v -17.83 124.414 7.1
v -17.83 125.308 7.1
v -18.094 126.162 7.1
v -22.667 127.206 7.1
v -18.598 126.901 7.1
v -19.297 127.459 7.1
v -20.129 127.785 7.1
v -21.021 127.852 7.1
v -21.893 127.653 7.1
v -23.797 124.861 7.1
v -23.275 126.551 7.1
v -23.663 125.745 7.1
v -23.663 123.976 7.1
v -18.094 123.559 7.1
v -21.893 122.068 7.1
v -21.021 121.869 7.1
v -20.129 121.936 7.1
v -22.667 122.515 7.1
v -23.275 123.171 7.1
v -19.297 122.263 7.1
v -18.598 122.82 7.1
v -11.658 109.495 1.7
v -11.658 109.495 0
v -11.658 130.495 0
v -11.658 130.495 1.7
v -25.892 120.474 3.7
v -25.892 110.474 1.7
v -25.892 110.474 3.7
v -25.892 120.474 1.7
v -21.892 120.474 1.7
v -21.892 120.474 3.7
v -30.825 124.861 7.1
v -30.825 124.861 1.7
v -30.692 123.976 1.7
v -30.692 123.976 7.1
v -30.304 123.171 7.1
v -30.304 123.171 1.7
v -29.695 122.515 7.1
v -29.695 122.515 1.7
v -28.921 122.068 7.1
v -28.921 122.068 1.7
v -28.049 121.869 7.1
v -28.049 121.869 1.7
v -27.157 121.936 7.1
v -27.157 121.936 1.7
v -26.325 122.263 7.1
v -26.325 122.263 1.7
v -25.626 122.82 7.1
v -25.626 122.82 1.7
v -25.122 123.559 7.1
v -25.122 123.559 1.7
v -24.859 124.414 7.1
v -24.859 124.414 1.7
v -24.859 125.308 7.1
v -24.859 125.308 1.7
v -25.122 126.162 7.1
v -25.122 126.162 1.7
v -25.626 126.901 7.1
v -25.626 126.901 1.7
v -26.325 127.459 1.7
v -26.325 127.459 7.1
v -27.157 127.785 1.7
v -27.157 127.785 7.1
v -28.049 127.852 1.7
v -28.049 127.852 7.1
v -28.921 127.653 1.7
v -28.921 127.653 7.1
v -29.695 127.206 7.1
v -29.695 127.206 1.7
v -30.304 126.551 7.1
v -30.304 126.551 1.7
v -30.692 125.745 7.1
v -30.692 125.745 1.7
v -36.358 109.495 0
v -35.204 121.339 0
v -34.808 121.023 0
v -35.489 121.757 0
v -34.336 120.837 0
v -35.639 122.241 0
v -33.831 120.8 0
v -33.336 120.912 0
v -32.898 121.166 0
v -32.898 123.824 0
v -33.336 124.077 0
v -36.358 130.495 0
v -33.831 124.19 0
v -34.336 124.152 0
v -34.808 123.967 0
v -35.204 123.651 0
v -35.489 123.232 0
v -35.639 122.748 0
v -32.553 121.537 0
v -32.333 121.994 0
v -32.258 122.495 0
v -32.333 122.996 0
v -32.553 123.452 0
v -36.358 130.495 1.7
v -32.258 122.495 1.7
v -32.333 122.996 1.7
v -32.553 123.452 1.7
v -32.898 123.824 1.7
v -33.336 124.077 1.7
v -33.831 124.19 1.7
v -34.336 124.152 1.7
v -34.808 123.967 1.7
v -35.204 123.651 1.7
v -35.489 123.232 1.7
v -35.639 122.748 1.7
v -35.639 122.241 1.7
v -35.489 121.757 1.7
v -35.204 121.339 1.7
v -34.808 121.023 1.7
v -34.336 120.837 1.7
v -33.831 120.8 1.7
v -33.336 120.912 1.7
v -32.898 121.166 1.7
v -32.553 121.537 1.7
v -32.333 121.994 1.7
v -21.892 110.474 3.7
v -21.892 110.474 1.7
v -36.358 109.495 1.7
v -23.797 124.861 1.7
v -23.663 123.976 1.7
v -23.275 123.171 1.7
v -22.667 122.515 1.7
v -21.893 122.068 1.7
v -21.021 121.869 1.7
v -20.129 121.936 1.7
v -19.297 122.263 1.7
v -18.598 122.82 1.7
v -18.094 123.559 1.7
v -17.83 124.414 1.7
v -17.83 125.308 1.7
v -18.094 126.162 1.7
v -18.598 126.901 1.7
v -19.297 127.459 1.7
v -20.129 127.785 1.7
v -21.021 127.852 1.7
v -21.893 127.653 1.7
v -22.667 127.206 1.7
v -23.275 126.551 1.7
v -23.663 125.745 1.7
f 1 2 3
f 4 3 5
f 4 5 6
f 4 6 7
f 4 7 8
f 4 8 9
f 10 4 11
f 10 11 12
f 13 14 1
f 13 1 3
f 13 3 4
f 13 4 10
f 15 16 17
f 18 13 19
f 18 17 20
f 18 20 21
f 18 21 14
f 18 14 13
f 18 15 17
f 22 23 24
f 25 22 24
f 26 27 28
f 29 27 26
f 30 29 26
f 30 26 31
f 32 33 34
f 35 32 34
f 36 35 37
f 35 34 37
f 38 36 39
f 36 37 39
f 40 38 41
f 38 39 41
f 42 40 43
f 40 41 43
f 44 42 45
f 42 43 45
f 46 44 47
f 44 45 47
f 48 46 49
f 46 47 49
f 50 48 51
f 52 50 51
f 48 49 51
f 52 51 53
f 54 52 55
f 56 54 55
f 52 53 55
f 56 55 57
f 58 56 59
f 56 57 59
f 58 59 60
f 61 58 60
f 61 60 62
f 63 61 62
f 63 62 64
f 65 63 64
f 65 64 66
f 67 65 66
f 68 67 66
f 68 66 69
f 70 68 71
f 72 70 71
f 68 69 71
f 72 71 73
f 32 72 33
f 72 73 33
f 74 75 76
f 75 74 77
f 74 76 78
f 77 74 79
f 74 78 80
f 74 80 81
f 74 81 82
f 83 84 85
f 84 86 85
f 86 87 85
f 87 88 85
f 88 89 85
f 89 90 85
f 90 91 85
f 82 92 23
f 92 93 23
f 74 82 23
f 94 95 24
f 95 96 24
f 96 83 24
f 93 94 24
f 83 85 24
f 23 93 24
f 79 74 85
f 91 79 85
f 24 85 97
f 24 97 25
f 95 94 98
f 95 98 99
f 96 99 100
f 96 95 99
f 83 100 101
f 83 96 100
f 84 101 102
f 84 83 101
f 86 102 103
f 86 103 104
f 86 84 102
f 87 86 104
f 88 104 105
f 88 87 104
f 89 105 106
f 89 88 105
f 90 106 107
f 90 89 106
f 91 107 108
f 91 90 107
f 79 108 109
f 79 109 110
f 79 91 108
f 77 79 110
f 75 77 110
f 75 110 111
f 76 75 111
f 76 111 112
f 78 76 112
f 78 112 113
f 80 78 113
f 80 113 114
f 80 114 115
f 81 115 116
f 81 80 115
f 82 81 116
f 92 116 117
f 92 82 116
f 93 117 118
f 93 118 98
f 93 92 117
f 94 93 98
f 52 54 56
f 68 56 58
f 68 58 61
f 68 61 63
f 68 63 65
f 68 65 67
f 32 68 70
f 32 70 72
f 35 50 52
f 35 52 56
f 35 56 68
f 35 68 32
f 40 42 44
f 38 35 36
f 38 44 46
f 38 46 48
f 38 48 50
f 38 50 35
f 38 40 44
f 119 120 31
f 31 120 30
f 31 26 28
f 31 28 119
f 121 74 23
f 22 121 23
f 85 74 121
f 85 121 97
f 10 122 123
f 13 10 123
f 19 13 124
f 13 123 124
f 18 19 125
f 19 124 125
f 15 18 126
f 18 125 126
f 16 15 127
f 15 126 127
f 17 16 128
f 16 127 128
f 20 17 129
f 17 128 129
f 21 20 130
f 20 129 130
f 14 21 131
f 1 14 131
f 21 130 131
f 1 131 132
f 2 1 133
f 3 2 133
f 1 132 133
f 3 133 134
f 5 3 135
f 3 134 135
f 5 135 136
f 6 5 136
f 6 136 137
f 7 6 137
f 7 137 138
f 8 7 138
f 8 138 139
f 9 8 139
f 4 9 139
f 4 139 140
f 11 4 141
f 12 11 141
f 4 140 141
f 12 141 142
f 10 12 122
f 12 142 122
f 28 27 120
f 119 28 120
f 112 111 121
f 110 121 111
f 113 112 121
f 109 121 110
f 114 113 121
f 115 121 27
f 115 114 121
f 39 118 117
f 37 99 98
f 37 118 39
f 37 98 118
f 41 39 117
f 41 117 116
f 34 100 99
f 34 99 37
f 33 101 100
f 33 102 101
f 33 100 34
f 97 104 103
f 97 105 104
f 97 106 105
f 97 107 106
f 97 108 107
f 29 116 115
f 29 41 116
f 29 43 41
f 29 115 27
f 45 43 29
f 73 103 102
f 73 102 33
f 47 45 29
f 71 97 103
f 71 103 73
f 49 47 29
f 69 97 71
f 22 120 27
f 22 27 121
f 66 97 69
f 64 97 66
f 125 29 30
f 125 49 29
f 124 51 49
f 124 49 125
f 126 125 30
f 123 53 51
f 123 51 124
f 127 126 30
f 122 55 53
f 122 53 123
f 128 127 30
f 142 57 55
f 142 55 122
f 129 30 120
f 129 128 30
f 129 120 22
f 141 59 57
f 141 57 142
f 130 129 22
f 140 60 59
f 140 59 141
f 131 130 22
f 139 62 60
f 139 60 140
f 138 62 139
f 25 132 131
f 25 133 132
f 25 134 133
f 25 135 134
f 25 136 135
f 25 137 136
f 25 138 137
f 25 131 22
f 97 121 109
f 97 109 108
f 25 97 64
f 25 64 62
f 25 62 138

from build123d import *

# Parameters (mm, degrees)
SKETCH_1_W      = 24.7
SKETCH_1_H      = 21
SKETCH_1_R      = 1.7
EXTRUDE_1_DEPTH = 1.7
SKETCH_2_R      = 3
EXTRUDE_2_DEPTH = 5.4
SKETCH_3_W      = 4
SKETCH_3_H      = 10
EXTRUDE_3_DEPTH = 2


with BuildPart() as part:
    # Эскиз1 → Бобышка-Вытянуть1 (new body)
    with BuildSketch(Plane.XY):
        with Locations((-24.007558734, 119.994849308)):
            Rectangle(SKETCH_1_W, SKETCH_1_H)
        with Locations((-33.957558734, 122.494849308)):
            Circle(SKETCH_1_R, mode=Mode.SUBTRACT)
    extrude(amount=EXTRUDE_1_DEPTH)

    # Эскиз2 → Бобышка-Вытянуть2 (add)
    with BuildSketch(Plane.XY.offset(1.7)):
        with Locations(Location((-27.825017342, 124.86066732, 0), (0, 0, 180))):
            Circle(SKETCH_2_R)
        with Locations(Location((-20.796714073, 124.86066732, 0), (0, 0, 180))):
            Circle(SKETCH_2_R)
    extrude(amount=EXTRUDE_2_DEPTH)

    # Эскиз3 → Бобышка-Вытянуть3 (add)
    with BuildSketch(Plane.XY.offset(1.7)):
        with Locations((-23.892041325, 115.47395964)):
            Rectangle(SKETCH_3_W, SKETCH_3_H)
    extrude(amount=EXTRUDE_3_DEPTH)


solid = part.part
